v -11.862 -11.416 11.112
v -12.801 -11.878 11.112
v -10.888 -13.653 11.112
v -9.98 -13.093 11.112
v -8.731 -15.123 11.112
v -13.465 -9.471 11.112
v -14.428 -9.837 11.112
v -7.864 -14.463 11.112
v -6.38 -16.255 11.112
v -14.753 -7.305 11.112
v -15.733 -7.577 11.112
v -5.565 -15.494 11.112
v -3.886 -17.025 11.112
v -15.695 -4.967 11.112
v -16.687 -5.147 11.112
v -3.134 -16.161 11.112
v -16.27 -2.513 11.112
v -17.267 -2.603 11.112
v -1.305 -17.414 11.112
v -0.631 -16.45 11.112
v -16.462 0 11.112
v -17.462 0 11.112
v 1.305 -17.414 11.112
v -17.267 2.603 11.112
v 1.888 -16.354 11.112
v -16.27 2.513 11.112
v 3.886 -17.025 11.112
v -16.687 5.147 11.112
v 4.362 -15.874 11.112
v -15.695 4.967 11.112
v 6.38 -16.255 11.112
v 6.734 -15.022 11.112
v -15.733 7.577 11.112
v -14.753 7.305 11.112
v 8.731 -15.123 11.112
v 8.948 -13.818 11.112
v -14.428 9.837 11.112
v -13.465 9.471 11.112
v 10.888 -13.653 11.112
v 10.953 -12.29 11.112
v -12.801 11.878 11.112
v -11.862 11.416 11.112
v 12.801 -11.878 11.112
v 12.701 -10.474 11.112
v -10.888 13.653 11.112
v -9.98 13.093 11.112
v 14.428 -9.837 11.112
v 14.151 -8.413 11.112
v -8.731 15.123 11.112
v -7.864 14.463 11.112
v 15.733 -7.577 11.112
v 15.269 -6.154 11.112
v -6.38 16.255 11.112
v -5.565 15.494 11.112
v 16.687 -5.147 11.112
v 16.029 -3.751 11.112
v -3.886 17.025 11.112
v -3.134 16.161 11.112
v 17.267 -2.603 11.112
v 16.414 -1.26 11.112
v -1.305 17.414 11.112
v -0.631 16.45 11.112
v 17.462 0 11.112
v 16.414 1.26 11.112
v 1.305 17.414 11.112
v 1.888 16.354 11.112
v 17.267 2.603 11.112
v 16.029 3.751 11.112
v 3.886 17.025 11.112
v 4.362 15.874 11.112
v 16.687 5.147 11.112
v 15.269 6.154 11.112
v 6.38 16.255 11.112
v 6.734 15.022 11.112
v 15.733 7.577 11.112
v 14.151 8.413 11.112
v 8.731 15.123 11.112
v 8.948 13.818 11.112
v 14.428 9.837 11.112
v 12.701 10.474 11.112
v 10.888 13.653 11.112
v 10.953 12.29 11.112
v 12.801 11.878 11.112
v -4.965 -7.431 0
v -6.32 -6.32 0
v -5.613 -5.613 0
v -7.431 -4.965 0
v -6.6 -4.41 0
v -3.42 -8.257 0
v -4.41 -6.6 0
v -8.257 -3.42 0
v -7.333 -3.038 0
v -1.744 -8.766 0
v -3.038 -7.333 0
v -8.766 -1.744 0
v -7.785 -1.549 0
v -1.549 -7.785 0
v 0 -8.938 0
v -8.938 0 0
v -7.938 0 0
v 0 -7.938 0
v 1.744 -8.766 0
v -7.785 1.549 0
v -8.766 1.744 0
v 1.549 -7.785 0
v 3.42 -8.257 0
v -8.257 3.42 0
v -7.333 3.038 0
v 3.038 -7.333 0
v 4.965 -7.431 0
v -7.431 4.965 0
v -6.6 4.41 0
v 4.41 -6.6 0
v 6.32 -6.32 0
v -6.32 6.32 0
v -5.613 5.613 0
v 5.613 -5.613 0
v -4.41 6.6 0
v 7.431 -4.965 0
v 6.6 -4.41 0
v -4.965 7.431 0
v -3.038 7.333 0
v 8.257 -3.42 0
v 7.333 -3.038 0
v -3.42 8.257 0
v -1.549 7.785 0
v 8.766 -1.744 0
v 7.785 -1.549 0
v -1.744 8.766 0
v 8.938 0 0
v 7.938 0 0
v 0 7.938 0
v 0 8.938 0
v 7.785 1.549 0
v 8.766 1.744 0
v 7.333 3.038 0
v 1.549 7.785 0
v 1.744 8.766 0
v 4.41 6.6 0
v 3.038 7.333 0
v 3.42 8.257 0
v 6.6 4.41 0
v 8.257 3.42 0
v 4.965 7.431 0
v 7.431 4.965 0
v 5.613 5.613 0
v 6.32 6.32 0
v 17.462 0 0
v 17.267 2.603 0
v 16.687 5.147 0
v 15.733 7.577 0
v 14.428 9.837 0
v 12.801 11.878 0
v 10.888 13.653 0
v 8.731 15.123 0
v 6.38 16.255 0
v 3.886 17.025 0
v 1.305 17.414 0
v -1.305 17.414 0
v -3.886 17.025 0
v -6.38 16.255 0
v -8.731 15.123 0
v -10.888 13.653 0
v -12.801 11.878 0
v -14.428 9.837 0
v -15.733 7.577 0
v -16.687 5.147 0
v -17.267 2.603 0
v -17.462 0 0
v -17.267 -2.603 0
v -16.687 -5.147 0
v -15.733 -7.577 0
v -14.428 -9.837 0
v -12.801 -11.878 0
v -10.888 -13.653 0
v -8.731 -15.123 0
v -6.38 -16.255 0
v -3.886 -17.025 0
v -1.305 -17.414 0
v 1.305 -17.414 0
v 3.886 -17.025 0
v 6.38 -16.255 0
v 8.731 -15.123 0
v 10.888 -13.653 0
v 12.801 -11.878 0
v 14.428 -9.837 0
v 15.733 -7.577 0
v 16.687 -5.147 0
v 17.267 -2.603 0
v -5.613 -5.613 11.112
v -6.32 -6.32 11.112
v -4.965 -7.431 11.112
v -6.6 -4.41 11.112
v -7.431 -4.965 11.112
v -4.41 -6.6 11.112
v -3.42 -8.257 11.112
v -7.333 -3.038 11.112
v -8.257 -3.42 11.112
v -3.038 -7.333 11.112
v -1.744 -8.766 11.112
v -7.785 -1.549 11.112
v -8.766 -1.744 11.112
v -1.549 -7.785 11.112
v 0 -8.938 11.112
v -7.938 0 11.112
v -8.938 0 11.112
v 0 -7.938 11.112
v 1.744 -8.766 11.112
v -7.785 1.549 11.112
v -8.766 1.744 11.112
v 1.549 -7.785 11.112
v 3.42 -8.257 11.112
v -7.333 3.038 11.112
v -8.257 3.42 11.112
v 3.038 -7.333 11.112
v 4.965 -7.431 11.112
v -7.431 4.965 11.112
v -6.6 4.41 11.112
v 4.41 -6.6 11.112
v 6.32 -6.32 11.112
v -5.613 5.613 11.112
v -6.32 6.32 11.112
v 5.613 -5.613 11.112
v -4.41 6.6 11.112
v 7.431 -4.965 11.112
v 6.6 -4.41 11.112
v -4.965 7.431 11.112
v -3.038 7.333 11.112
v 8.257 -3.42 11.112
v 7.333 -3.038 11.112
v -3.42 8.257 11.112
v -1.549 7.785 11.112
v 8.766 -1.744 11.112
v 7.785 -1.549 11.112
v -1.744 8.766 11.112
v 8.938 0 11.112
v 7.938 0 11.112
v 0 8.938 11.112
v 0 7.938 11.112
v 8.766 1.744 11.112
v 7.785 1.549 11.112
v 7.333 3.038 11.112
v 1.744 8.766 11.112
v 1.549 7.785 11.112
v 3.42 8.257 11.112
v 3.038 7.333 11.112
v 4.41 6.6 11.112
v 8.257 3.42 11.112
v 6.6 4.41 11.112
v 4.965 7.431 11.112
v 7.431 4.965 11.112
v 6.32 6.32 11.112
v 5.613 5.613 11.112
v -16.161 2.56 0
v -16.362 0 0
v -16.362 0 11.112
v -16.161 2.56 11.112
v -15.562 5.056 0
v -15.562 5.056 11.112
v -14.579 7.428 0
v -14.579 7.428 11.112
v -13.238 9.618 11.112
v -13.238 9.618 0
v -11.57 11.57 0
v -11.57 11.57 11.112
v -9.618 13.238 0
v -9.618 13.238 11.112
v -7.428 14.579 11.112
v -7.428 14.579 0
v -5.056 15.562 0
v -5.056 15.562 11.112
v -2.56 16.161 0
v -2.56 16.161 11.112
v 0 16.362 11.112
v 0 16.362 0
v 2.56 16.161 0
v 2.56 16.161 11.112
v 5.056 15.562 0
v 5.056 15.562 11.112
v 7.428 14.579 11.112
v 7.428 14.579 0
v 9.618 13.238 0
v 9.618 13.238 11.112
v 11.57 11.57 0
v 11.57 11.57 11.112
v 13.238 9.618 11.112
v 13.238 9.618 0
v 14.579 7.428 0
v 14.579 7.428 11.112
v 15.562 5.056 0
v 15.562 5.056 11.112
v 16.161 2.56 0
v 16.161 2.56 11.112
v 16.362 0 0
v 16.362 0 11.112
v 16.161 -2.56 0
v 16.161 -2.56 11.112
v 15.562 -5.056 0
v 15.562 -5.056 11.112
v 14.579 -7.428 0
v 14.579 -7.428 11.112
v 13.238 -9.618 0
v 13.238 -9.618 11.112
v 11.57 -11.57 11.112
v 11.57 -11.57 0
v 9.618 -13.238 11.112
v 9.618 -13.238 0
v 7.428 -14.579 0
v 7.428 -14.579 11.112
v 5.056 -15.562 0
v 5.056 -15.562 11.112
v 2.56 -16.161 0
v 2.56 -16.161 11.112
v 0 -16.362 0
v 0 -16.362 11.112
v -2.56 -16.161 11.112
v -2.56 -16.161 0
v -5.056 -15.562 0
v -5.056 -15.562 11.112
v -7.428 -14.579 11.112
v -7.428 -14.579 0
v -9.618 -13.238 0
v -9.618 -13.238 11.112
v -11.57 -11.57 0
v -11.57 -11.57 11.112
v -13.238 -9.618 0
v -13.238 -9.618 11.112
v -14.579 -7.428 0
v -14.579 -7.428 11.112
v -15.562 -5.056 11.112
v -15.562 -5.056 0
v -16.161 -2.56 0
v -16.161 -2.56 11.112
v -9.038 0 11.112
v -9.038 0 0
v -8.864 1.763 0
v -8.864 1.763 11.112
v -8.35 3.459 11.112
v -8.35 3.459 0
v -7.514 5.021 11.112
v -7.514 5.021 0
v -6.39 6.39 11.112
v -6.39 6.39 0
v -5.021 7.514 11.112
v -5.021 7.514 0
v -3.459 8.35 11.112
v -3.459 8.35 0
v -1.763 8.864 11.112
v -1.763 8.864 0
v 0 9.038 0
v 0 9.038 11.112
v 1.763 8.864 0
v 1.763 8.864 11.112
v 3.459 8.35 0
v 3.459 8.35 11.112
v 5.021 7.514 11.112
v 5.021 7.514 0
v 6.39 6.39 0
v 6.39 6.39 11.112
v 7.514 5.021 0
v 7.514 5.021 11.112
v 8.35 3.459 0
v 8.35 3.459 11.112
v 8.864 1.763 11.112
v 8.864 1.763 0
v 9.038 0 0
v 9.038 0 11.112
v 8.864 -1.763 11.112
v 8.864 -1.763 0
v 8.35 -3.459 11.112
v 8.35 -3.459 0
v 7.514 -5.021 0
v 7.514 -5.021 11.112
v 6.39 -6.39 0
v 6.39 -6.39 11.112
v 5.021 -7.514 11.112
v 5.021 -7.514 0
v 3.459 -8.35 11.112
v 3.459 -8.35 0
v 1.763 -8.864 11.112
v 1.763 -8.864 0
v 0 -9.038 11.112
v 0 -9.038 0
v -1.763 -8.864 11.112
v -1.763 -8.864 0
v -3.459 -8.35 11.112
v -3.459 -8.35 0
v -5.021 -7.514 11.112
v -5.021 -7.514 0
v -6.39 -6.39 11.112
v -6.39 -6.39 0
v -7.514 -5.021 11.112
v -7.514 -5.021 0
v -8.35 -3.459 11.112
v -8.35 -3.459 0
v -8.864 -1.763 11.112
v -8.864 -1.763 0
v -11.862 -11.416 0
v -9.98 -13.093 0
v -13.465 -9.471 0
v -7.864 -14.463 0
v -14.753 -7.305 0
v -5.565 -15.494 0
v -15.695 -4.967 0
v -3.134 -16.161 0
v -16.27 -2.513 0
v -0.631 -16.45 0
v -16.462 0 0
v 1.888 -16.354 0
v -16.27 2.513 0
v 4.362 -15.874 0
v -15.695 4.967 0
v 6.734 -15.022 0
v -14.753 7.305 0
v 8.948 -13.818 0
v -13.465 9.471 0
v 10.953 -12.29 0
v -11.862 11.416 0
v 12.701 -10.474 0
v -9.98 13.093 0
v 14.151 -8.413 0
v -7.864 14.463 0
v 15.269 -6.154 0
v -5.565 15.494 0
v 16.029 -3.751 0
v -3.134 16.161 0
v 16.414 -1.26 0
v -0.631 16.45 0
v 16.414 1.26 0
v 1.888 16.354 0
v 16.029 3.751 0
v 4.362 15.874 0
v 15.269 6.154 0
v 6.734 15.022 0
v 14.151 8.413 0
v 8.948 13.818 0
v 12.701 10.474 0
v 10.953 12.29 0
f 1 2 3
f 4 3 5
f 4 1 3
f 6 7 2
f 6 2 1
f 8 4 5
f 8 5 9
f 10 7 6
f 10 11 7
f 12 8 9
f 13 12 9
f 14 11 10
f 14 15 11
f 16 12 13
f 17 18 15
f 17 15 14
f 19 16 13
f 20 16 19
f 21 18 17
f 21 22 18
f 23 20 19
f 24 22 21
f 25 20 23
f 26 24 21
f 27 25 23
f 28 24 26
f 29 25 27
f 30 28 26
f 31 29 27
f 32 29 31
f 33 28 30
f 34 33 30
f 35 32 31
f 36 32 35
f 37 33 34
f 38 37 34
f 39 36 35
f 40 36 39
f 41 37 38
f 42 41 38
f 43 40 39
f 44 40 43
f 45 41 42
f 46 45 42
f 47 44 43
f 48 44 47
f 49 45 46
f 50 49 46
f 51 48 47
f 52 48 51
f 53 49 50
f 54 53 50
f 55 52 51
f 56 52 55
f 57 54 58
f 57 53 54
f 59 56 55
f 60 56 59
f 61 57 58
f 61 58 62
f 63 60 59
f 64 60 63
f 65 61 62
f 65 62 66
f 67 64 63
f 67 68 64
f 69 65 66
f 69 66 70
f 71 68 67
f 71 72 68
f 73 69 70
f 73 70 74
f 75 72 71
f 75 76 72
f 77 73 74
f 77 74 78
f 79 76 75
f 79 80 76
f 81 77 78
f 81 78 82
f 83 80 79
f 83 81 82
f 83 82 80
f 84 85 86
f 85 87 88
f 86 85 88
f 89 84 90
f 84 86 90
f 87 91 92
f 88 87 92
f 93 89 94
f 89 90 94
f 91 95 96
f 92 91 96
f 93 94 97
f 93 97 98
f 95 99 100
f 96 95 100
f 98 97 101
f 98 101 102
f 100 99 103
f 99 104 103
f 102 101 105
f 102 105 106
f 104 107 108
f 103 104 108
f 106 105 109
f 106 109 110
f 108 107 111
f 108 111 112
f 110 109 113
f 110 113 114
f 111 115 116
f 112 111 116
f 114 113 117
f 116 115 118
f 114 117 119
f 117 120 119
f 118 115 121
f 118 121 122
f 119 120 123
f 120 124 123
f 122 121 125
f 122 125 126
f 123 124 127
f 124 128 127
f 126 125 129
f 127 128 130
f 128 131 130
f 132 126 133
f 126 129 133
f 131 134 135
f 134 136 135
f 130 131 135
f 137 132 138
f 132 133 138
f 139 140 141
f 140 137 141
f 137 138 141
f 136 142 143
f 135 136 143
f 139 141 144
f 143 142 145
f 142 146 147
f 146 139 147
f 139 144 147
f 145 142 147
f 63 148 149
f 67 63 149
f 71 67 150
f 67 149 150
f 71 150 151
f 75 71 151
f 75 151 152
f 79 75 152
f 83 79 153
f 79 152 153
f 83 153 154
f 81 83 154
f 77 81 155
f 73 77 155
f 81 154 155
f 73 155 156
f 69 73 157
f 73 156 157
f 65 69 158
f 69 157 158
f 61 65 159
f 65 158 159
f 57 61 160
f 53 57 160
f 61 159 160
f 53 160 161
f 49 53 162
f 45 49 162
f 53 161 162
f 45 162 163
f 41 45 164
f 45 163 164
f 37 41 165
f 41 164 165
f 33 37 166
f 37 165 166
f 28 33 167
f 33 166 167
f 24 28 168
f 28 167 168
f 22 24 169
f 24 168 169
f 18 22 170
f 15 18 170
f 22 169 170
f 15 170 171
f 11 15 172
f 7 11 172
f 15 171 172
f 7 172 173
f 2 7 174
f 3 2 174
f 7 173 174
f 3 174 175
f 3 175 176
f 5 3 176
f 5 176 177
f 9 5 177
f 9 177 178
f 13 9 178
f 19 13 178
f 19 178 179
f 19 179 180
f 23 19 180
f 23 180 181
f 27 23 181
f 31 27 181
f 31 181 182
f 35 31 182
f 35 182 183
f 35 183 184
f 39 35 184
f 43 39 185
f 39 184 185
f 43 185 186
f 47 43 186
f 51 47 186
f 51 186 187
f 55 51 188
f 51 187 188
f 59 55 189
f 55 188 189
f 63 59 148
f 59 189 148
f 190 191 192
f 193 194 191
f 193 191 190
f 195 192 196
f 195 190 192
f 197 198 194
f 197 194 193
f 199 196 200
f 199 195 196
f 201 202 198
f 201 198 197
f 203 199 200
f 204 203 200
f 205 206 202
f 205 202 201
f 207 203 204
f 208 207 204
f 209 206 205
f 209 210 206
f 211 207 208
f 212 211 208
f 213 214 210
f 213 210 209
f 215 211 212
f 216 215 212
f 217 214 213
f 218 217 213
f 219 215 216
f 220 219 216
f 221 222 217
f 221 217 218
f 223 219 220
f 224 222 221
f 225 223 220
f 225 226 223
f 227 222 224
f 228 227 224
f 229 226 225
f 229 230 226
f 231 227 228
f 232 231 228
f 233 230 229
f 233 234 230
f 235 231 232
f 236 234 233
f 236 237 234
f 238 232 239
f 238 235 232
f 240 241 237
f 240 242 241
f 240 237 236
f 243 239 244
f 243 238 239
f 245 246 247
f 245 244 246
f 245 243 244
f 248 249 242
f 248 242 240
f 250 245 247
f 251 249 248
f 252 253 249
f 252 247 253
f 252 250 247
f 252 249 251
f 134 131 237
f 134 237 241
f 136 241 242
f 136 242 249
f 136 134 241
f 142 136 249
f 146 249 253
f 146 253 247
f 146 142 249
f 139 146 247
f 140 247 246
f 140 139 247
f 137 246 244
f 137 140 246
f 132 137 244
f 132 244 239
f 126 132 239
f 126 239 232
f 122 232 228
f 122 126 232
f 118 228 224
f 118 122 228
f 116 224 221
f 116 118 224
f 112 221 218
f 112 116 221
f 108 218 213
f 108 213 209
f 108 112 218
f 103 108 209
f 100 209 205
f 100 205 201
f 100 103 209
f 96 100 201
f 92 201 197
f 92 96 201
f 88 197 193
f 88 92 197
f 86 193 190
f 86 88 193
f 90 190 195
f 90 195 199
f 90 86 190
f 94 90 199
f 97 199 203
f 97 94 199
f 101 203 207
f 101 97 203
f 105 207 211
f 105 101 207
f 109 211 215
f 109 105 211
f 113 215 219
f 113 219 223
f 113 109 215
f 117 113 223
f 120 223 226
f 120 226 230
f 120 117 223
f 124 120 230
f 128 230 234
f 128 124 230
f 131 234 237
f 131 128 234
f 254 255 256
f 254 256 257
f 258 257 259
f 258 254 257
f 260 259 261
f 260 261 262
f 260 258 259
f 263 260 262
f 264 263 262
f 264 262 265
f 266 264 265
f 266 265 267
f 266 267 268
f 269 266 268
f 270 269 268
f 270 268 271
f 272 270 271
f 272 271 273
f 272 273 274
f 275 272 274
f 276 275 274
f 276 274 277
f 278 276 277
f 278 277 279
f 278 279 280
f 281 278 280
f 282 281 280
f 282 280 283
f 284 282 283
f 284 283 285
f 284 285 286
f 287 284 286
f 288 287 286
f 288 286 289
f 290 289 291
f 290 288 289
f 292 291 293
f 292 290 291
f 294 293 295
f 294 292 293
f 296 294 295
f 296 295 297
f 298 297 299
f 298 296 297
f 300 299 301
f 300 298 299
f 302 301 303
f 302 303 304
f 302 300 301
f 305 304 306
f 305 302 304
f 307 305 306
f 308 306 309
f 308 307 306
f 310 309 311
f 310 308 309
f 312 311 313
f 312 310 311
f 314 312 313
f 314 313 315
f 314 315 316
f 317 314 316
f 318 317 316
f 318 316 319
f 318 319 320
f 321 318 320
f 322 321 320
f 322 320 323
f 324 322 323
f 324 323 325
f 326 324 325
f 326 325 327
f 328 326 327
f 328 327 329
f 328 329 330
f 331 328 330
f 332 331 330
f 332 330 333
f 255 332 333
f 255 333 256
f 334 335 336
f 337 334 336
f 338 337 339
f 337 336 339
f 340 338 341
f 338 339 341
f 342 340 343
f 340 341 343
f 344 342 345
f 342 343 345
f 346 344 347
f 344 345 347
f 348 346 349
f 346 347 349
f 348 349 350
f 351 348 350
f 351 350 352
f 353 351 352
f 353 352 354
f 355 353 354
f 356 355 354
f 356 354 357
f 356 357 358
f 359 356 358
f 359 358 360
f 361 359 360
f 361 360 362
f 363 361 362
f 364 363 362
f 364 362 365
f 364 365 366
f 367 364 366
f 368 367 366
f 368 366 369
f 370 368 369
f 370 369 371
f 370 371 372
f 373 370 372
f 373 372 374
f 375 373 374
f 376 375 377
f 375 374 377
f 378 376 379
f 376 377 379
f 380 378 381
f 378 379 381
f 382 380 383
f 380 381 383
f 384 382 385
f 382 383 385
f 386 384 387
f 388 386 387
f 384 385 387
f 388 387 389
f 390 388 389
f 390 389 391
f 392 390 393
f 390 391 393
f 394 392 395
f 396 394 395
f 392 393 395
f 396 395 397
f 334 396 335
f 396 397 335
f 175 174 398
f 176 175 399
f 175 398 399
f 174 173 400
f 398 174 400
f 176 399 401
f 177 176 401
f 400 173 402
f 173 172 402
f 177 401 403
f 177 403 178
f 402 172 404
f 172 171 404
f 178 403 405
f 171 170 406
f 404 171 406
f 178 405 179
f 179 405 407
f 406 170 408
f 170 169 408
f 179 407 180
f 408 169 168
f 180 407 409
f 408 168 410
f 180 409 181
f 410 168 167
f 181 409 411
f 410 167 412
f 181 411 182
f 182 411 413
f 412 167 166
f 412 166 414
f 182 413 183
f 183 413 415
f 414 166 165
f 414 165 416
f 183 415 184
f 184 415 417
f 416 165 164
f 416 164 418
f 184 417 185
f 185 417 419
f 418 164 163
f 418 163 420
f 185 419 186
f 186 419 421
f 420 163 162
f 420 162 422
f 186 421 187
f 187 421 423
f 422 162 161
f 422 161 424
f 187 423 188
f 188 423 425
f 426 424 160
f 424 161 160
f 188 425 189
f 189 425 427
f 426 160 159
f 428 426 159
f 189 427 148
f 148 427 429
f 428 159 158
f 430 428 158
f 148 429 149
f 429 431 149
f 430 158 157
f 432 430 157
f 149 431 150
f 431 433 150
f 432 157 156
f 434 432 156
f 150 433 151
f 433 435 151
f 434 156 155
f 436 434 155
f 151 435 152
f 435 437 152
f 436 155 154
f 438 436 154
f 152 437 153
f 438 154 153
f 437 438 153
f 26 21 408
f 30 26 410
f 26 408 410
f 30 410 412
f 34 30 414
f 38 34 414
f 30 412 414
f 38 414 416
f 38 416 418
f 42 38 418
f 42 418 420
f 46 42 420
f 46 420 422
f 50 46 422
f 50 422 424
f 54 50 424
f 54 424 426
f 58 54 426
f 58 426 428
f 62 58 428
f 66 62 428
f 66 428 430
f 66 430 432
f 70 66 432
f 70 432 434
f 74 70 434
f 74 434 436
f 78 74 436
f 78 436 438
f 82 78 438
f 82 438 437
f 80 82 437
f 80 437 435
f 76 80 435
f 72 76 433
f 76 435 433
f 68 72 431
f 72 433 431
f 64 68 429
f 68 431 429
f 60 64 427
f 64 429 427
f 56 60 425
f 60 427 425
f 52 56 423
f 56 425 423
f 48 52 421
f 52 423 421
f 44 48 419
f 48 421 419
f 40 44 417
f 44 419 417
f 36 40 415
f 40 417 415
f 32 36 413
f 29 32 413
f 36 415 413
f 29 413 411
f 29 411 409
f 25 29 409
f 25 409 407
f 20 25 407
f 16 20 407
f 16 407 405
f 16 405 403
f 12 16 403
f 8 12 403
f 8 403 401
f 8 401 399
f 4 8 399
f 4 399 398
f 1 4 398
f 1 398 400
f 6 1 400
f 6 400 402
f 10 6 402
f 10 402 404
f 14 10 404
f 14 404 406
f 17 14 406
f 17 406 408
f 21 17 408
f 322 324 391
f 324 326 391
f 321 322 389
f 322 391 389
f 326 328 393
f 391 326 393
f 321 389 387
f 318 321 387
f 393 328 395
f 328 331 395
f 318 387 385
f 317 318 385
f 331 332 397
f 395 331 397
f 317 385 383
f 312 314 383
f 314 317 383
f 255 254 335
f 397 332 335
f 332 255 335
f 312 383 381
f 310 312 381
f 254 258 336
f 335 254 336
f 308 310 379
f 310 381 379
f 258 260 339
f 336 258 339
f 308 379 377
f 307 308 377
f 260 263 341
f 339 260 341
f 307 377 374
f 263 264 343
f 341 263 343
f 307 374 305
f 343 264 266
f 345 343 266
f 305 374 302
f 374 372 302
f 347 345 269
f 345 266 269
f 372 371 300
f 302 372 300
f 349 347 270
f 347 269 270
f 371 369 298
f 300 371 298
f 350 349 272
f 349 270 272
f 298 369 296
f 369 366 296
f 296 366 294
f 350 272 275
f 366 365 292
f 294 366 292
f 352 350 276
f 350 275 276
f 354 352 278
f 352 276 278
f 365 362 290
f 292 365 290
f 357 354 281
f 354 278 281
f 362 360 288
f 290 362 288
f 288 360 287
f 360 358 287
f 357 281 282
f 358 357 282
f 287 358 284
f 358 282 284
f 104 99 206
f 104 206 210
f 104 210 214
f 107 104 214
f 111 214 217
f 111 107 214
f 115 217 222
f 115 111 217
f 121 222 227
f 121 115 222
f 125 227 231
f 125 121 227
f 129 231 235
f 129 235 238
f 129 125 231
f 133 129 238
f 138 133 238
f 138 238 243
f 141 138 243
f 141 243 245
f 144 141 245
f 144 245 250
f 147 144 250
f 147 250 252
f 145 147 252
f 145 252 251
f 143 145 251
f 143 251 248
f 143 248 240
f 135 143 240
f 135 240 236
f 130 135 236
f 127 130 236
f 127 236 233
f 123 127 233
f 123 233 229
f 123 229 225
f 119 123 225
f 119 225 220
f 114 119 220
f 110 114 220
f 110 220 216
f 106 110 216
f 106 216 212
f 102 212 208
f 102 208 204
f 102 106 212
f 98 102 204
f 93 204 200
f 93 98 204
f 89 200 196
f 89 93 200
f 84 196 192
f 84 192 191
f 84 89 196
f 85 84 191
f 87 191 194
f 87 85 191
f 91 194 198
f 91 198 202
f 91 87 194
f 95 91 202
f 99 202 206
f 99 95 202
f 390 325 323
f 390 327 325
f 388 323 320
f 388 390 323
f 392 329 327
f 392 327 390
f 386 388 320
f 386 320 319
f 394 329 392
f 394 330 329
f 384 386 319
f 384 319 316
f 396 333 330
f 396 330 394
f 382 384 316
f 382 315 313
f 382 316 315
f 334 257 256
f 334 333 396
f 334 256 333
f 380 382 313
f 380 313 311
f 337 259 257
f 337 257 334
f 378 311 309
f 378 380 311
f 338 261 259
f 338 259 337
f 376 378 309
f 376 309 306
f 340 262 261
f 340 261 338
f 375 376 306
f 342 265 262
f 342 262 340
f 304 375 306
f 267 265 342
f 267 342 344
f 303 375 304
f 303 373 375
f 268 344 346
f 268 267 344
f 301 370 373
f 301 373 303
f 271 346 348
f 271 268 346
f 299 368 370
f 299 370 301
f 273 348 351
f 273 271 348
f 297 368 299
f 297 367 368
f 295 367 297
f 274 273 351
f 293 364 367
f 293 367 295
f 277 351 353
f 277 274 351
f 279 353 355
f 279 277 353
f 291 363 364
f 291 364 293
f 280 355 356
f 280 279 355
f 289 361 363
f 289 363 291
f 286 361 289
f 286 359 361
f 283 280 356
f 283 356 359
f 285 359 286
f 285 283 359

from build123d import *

# Parameters (mm, degrees)
CROQUIS1_R              = 17.4625
CROQUIS1_R_2            = 7.9375
SALIENTE_EXTRUIR1_DEPTH = 11.112
CROQUIS5_R              = 16.4625
CROQUIS5_R_2            = 16.3625
CROQUIS5_R_3            = 9.0375
CROQUIS5_R_4            = 8.9375
CORTAR_EXTRUIR4_DEPTH   = 20.5


with BuildPart() as part:
    # Croquis1 → Saliente-Extruir1 (new body)
    with BuildSketch(Plane.XY):
        Circle(CROQUIS1_R)
        Circle(CROQUIS1_R_2, mode=Mode.SUBTRACT)
    extrude(amount=SALIENTE_EXTRUIR1_DEPTH)

    # Croquis5 → Cortar-Extruir4 (cut)
    with BuildSketch(Plane(origin=(0, 0, 0), x_dir=(-1, 0, 0), z_dir=(0, 0, -1))):
        Circle(CROQUIS5_R)
        Circle(CROQUIS5_R_2, mode=Mode.SUBTRACT)
        Circle(CROQUIS5_R_3)
        Circle(CROQUIS5_R_4, mode=Mode.SUBTRACT)
    extrude(amount=-CORTAR_EXTRUIR4_DEPTH, mode=Mode.SUBTRACT)


with BuildPart() as cortar_extruir4_piece_1:
    # of the separate pieces the step leaves, piece 1, a body of its own (cortar_extruir4_pieces)
    add(part.part.solids().sort_by_distance((-16.3625, 0, 0))[0])


with BuildPart() as cortar_extruir4_piece_2:
    # of the separate pieces the step leaves, piece 2, a body of its own (cortar_extruir4_pieces)
    add(part.part.solids().sort_by_distance((17.4625, 0, 0))[0])


with BuildPart() as cortar_extruir4_piece_3:
    # of the separate pieces the step leaves, piece 3, a body of its own (cortar_extruir4_pieces)
    add(part.part.solids().sort_by_distance((-8.9375, 0, 0))[0])


solid = Compound([cortar_extruir4_piece_1.part, cortar_extruir4_piece_2.part, cortar_extruir4_piece_3.part])
